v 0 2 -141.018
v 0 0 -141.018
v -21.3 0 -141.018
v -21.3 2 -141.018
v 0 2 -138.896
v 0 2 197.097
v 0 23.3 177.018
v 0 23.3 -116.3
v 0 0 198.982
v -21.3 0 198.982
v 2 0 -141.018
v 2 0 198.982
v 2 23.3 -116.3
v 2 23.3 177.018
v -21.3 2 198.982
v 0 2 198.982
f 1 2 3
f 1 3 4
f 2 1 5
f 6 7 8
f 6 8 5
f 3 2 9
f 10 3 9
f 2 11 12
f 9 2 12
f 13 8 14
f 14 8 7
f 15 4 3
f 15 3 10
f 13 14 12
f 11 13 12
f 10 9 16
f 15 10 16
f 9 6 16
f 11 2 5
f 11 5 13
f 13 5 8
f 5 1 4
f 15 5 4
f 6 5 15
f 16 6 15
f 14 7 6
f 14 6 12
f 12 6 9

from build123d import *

# Parameters (mm, degrees)
BOSS_EXTRUDE1_DEPTH = 2
SKETCH2_W           = 340
SKETCH2_H           = 2
BOSS_EXTRUDE2_DEPTH = 21.3


with BuildPart() as part:
    # Sketch1 → Boss-Extrude1 (new body)
    with BuildSketch(Plane(origin=(0, 0, 0), x_dir=(0, 0, -1), z_dir=(1, 0, 0))):
        Polygon((-198.982035928, 0), (141.017964072, 0), (116.300201593, 23.3), (-177.018478326, 23.3), align=None)
    extrude(amount=BOSS_EXTRUDE1_DEPTH)

    # Sketch2 → Boss-Extrude2 (add)
    with BuildSketch(Plane.ZY):
        with Locations((28.982035928, 1)):
            Rectangle(SKETCH2_W, SKETCH2_H)
    extrude(amount=BOSS_EXTRUDE2_DEPTH)


solid = part.part
